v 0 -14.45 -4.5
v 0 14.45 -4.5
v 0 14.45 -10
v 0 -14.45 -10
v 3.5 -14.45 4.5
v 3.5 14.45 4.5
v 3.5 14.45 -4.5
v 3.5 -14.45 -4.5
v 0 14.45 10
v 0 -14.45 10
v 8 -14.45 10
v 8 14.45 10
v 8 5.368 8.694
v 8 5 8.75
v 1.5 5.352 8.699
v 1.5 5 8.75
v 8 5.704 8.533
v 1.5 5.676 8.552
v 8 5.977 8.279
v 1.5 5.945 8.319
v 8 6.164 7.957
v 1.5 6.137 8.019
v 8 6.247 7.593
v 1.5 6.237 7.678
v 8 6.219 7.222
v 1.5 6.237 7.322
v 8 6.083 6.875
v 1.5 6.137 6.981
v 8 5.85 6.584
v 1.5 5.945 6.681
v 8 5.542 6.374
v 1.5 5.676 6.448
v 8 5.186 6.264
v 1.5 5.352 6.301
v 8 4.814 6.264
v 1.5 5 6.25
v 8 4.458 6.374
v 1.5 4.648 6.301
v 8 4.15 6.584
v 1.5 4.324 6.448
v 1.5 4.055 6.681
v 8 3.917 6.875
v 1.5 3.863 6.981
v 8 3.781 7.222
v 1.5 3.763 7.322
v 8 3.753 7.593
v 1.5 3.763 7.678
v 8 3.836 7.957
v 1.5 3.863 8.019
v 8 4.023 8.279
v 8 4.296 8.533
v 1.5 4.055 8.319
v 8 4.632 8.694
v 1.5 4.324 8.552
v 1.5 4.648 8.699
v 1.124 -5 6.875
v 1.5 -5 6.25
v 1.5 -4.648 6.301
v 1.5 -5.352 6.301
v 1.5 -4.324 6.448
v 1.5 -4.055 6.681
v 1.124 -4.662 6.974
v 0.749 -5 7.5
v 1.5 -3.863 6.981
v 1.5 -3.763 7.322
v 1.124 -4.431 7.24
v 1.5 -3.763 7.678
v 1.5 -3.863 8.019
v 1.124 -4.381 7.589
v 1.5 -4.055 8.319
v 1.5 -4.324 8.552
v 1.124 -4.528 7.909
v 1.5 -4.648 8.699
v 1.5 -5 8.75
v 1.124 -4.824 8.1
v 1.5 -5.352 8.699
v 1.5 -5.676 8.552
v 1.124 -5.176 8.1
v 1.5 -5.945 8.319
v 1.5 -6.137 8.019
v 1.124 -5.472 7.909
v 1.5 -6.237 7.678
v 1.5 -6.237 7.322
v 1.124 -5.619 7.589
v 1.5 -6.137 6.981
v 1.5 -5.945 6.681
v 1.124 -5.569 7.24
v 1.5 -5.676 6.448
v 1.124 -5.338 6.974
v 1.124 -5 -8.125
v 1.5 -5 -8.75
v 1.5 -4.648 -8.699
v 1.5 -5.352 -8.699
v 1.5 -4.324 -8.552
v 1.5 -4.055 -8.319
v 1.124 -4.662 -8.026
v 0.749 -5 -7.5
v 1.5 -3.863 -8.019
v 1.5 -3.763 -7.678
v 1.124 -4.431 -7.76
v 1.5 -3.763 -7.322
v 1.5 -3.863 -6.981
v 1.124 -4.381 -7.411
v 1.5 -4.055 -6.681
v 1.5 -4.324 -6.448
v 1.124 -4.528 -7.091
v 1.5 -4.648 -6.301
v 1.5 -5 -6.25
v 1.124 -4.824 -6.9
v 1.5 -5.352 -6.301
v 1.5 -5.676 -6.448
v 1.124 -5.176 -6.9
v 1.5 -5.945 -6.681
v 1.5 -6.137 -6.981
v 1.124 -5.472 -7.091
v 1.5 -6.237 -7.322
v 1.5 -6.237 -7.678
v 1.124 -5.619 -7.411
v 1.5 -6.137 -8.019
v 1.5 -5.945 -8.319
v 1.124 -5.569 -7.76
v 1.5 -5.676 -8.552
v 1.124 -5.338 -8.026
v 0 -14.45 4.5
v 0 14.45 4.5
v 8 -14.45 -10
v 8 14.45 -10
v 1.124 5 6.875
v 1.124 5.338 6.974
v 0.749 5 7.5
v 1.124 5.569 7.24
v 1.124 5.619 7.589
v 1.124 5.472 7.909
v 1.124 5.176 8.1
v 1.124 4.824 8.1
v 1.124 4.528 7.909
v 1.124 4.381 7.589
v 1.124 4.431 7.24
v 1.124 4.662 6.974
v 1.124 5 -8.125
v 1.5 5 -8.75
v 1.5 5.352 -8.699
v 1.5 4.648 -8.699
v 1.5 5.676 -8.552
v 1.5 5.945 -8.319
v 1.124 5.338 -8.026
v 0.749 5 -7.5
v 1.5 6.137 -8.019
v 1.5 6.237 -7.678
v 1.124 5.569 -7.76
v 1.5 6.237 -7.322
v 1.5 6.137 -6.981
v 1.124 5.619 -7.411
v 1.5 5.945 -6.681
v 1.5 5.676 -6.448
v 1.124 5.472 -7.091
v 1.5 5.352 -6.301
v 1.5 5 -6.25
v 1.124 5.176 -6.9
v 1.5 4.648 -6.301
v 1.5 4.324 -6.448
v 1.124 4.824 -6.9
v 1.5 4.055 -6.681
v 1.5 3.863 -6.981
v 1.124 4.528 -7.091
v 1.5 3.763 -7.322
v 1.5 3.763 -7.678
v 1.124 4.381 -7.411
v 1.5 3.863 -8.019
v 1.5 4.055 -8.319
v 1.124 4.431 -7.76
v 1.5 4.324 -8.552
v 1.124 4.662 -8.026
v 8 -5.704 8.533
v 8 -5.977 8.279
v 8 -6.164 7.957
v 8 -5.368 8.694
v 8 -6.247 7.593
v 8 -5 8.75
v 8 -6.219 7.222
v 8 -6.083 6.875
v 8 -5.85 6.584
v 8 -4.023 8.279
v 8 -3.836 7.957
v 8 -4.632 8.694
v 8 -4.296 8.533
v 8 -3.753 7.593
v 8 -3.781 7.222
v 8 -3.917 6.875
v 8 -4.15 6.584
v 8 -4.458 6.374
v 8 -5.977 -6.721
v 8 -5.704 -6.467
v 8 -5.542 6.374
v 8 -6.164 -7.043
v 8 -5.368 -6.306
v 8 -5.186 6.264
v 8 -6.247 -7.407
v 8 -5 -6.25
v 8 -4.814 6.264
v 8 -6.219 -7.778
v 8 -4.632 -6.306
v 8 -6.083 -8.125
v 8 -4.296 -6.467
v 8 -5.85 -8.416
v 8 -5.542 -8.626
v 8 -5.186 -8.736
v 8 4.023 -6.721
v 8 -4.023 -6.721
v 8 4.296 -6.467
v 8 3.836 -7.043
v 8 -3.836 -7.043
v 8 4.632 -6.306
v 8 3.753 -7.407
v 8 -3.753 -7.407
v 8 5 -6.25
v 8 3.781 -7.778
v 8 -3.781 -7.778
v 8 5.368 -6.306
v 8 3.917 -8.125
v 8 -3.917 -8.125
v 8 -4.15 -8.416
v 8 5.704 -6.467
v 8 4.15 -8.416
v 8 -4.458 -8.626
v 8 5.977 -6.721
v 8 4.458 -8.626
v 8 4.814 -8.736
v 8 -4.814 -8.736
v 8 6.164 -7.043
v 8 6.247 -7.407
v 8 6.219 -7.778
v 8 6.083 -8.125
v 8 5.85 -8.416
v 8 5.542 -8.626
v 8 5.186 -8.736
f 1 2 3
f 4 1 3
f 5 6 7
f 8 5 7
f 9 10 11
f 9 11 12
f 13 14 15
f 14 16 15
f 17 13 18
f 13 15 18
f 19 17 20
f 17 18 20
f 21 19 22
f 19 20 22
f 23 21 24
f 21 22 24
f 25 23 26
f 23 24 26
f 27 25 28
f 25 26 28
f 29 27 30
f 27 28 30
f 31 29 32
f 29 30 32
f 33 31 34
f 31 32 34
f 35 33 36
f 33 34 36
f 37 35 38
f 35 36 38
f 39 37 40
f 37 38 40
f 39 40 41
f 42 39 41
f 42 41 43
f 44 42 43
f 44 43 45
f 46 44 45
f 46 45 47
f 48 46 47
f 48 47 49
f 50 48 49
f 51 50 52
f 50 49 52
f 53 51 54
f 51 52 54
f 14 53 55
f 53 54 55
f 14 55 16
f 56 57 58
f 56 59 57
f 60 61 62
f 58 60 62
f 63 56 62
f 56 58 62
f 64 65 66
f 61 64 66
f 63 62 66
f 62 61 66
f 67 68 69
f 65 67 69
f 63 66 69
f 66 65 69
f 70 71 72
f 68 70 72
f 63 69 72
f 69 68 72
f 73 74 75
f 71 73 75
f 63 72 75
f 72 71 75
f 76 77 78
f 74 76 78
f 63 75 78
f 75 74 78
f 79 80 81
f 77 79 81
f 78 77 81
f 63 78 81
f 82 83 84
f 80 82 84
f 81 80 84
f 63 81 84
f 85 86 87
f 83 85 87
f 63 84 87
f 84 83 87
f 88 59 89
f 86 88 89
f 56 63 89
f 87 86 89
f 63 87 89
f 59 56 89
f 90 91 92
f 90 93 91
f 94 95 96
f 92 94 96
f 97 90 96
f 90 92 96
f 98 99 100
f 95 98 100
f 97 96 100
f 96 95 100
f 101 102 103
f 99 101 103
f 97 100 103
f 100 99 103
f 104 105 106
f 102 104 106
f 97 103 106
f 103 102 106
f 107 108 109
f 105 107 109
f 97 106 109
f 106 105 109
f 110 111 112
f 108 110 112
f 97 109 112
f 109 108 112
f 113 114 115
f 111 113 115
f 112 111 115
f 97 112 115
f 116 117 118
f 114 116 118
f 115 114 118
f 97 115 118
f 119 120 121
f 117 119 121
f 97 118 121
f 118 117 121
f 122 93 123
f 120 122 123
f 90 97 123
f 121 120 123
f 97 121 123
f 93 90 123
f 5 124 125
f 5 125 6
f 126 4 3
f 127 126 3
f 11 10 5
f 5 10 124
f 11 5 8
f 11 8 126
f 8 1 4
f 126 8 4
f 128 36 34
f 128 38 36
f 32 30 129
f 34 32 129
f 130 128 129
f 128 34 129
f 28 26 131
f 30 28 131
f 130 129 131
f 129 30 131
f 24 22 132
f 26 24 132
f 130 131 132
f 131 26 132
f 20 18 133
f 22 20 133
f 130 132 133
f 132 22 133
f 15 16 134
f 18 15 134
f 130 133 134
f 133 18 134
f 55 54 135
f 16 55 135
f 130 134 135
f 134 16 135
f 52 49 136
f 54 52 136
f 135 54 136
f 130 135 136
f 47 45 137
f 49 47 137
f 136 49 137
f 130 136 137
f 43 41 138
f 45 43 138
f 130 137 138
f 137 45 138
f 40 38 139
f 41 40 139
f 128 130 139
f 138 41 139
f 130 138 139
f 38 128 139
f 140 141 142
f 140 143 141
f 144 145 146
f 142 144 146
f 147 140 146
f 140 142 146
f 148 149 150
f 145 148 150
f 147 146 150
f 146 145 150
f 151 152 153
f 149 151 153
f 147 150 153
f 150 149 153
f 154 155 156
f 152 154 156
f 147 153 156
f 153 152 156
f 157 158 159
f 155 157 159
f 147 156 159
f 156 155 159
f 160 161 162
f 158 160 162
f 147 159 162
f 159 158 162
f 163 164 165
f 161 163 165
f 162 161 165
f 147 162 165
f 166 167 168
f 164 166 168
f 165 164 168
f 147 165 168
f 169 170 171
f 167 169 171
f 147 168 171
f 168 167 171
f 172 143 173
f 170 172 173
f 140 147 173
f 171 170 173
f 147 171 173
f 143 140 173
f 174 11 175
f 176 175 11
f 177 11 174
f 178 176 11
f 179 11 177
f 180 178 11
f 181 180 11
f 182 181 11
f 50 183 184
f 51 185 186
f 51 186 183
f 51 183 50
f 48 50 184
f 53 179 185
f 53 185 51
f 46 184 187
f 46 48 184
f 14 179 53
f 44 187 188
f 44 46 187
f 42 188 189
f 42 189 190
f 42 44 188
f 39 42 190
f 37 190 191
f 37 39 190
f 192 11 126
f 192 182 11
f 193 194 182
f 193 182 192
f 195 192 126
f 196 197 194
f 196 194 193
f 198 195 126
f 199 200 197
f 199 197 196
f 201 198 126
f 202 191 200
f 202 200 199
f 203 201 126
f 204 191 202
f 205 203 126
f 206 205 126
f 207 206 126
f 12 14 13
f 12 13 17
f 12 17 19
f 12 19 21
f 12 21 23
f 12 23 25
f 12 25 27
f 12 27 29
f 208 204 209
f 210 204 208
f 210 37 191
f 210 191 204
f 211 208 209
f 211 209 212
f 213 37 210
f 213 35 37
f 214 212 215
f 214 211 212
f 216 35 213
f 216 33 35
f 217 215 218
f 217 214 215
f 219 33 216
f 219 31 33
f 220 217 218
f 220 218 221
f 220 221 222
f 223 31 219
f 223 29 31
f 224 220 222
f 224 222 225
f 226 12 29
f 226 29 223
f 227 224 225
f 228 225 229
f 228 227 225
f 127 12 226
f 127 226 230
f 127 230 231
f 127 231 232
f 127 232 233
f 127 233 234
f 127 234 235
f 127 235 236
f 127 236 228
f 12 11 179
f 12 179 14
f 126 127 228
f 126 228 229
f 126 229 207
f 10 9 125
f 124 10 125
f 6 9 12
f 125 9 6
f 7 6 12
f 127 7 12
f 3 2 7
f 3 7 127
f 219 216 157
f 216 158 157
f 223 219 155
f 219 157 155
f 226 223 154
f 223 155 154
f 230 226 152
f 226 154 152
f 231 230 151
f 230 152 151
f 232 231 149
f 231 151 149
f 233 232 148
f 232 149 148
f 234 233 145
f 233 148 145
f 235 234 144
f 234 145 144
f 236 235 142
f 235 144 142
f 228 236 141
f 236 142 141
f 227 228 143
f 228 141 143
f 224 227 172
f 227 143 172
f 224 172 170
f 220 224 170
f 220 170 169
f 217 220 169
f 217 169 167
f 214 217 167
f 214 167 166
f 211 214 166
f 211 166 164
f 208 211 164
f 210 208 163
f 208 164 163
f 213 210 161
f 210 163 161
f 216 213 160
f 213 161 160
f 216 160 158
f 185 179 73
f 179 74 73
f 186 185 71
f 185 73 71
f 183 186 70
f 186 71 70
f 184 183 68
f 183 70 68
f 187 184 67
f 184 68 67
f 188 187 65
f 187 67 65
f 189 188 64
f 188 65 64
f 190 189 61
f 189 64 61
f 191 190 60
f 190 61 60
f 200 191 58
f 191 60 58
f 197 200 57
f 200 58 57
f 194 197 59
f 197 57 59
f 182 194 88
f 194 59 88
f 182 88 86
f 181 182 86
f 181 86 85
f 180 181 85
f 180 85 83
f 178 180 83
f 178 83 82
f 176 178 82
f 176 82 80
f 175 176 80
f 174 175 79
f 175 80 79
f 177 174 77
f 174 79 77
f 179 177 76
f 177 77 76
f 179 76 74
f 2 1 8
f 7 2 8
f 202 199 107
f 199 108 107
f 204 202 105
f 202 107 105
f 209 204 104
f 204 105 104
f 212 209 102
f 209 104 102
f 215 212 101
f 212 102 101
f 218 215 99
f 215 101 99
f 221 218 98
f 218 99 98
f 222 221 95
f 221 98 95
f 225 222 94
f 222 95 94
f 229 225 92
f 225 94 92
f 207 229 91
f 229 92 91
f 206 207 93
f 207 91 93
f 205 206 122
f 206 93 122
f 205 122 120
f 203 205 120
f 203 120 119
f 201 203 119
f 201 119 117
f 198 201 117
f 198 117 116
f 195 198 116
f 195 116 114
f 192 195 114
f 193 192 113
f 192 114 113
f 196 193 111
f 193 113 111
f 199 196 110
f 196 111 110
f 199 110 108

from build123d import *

# Parameters (mm, degrees)
SKETCH_1_W             = 20
SKETCH_1_H             = 28.9
EXTRUDE_1_DEPTH        = 8
SKETCH_2_W             = 3.5
SKETCH_2_H             = 9
CUT_EXTRUDE_1_DEPTH    = 32.610283137
HOLE_WIZARD_M3_1_D     = 2.5
HOLE_WIZARD_M3_1_DEPTH = 6.5
HOLE_WIZARD_M3_1_TIP   = 0.751075774


with BuildPart() as part:
    # 草图1 → 凸台-拉伸1 (new body)
    with BuildSketch(Plane(origin=(0, 0, 0), x_dir=(0, 0, -1), z_dir=(1, 0, 0))):
        Rectangle(SKETCH_1_W, SKETCH_1_H)
    extrude(amount=EXTRUDE_1_DEPTH)

    # 草图2 → 切除-拉伸1 (cut, through all)
    with BuildSketch(Plane(origin=(0, 14.45, 0), x_dir=(1, 0, 0), z_dir=(0, 1, 0))):
        with Locations((1.75, 0)):
            Rectangle(SKETCH_2_W, SKETCH_2_H)
    extrude(amount=-CUT_EXTRUDE_1_DEPTH, mode=Mode.SUBTRACT)

    # M3 螺纹孔1
    with Locations(Plane(origin=(8, 0, 0), x_dir=(0, 0, -1), z_dir=(1, 0, 0))):
        with Locations((-7.5, 5), (7.5, -5), (-7.5, -5), (7.5, 5)):
            Hole(HOLE_WIZARD_M3_1_D / 2, depth=HOLE_WIZARD_M3_1_DEPTH)
            with Locations((0, 0, -(HOLE_WIZARD_M3_1_DEPTH + HOLE_WIZARD_M3_1_TIP / 2))):  # 118° drill point
                Cone(0, HOLE_WIZARD_M3_1_D / 2, HOLE_WIZARD_M3_1_TIP, mode=Mode.SUBTRACT)


solid = part.part
